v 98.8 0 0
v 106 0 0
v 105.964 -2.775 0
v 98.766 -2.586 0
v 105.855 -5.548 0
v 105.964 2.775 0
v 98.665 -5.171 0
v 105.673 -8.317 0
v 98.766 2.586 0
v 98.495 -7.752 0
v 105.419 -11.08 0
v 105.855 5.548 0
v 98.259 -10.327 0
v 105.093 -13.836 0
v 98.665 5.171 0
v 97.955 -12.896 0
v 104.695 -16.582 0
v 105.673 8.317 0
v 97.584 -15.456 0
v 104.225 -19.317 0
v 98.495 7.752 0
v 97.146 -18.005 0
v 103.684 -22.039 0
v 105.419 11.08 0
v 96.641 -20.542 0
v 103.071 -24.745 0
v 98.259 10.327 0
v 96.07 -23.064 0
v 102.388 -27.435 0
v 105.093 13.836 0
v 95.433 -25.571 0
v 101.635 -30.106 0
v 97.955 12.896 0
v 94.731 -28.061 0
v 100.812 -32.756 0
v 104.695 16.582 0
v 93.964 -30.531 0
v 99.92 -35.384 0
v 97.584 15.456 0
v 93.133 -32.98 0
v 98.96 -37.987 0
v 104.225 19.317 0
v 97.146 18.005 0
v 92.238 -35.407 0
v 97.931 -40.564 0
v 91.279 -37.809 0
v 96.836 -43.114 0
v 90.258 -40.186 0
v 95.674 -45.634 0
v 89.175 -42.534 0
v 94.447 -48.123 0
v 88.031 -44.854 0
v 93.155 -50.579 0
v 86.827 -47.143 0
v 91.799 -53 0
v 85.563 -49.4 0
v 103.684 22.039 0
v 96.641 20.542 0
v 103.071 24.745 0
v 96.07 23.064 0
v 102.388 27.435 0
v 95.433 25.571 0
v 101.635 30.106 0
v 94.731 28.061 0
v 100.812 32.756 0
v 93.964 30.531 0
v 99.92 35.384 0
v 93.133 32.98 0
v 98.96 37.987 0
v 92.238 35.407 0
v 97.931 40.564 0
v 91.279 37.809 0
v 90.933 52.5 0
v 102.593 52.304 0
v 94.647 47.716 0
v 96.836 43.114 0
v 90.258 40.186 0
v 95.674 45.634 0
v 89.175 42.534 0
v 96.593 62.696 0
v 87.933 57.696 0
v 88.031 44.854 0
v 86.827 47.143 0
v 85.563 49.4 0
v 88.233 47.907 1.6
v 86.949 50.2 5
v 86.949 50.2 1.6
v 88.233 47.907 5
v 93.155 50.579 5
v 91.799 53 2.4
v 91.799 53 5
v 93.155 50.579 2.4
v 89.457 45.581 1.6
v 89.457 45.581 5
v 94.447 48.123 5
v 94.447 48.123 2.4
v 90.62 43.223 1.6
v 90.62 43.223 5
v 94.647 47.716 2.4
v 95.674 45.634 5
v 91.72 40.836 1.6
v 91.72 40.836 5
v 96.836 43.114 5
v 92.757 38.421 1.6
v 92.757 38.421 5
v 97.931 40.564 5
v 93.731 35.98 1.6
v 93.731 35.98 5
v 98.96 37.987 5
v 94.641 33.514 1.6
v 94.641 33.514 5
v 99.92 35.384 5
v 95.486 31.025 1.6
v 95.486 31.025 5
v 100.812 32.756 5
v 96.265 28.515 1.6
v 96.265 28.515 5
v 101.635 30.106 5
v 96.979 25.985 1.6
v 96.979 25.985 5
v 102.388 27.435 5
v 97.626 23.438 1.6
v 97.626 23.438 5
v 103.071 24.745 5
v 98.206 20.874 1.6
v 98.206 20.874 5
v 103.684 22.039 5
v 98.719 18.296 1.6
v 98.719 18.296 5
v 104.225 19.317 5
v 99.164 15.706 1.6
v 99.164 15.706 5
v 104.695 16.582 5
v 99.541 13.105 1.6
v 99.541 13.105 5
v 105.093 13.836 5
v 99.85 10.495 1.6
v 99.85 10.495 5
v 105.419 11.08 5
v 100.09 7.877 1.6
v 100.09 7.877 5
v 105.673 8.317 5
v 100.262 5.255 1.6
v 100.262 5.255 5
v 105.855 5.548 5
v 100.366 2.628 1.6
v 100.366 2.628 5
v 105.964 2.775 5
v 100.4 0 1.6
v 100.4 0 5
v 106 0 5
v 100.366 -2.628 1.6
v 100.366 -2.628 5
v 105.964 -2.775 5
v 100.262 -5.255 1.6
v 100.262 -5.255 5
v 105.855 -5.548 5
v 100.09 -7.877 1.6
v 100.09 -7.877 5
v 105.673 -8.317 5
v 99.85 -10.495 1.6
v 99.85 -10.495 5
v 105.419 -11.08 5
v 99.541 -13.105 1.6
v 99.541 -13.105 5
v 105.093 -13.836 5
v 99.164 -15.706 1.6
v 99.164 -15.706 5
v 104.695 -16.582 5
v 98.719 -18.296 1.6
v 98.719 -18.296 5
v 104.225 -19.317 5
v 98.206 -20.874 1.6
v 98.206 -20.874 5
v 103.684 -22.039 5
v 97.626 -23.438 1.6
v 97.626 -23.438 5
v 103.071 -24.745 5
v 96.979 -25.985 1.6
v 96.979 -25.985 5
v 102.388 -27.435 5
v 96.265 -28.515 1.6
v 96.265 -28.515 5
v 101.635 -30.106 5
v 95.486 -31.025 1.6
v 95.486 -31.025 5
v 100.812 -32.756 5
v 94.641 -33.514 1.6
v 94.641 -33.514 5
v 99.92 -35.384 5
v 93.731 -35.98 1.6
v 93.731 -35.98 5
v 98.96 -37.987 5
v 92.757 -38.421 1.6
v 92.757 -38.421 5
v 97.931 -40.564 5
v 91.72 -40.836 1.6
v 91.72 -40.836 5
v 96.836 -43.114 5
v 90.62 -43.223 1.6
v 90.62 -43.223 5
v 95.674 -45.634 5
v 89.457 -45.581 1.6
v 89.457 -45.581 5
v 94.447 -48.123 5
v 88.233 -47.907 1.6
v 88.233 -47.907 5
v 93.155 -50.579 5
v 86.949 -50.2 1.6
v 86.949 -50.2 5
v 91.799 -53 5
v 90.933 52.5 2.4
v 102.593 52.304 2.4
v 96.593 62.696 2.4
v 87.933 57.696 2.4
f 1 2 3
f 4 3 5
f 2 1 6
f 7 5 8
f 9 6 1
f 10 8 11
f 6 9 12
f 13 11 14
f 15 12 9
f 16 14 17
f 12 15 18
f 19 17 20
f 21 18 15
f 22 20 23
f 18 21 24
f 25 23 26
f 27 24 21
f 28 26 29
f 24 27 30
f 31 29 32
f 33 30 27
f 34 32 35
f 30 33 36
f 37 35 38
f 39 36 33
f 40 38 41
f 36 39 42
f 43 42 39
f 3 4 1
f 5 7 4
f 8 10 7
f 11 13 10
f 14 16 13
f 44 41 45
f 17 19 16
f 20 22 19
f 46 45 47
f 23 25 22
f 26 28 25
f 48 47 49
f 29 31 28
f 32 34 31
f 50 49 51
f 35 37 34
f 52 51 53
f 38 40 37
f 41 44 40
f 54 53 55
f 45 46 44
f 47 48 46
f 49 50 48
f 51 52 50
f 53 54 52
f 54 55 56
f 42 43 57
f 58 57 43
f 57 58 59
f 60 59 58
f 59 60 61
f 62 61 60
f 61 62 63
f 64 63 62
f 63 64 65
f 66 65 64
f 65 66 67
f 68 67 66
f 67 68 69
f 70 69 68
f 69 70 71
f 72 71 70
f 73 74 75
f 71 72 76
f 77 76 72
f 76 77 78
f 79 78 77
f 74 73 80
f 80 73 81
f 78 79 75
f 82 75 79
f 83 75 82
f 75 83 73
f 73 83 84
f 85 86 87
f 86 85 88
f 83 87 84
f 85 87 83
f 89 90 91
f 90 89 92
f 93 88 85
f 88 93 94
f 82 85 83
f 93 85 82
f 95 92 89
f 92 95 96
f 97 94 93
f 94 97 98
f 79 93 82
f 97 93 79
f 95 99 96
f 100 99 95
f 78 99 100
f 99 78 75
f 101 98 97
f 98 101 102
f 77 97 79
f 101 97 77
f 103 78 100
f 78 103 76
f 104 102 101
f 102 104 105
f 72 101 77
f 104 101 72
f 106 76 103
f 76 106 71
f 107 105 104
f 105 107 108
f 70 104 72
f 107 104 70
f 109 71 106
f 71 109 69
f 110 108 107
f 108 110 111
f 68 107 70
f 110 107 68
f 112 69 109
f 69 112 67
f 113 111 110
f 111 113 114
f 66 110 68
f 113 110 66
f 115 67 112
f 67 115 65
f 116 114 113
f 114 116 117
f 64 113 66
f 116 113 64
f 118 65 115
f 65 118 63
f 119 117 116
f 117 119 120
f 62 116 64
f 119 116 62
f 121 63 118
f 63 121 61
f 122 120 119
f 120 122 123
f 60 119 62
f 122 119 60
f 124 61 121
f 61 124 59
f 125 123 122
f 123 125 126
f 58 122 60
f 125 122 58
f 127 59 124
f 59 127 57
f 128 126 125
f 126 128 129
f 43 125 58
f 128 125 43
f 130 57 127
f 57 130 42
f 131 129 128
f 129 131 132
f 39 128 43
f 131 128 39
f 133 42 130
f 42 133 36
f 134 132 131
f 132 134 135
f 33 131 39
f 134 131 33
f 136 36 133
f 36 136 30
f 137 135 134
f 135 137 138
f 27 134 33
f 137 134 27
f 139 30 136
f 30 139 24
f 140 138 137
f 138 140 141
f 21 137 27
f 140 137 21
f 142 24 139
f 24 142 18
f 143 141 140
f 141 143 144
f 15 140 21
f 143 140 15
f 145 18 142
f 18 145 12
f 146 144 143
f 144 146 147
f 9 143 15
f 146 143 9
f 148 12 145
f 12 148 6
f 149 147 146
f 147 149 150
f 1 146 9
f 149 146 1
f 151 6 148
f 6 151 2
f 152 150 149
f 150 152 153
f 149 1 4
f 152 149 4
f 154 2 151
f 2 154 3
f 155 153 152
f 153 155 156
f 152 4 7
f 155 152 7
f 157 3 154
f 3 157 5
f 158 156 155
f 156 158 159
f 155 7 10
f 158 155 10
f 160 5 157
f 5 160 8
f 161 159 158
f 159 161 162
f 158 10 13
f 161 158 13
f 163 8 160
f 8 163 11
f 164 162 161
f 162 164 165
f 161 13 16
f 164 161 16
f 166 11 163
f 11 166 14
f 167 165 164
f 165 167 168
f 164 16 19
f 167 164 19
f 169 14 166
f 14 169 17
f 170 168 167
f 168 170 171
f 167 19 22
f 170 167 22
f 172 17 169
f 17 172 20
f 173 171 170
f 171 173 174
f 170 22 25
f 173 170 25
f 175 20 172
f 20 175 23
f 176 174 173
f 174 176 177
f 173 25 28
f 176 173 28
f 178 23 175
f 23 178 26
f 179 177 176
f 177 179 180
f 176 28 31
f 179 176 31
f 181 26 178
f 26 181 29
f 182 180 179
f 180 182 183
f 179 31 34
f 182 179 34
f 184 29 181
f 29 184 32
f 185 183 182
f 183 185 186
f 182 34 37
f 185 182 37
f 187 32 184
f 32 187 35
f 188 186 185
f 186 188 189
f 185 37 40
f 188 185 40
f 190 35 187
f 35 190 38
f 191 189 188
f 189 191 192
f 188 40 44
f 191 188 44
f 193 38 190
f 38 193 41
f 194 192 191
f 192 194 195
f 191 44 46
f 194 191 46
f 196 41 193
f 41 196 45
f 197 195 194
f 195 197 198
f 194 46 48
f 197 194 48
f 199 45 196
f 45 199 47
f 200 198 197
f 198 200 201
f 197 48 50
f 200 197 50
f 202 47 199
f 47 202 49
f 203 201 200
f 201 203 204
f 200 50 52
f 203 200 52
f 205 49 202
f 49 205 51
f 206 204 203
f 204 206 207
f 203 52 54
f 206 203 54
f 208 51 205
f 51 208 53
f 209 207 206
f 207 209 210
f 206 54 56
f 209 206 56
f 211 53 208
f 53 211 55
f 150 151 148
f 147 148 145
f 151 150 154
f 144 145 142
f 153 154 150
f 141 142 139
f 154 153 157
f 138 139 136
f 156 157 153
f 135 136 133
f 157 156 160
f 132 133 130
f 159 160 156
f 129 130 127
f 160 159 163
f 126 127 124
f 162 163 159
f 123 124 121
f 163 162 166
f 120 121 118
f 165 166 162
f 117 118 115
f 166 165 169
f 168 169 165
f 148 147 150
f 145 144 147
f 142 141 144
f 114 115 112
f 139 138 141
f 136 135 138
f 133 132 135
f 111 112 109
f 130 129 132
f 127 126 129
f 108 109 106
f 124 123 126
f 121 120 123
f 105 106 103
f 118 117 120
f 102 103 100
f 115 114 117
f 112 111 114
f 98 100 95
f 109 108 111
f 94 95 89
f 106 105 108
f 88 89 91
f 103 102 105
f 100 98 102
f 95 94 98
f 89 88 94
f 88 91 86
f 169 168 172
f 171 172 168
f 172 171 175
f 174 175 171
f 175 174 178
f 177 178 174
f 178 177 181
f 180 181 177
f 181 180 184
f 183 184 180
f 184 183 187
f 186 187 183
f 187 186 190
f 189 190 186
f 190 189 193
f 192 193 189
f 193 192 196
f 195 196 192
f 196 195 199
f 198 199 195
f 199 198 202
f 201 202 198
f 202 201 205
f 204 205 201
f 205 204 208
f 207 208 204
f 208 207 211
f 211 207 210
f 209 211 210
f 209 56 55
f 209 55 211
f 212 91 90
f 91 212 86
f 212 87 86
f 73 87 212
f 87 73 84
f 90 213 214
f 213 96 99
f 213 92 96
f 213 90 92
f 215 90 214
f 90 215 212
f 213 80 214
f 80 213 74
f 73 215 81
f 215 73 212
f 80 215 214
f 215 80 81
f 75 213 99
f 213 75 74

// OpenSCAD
// Saucer topper - a printed platter that drops onto a bought turntable.
//
// THIS IS TWO PRINTS, PLUS A GAUGE YOU PRINT FIRST:
//
//   gauge    <- print this ONE first. A 60-degree arc of the ring, ~10 minutes.
//   ring     <- the locator, once the gauge fits
//   platter  <- the disc the saucer sits in
//
//   openscad --render -D 'part="gauge"' -o tt_gauge.stl topper.scad
//
// view_assembly is a PICTURE, not a part.
//
// WHY THIS REPLACED A WHOLE MOTORISED TURNTABLE
//
// The DIY version - ball race, GT2 belt, NEMA17, TMC2209, an ESP32 and an
// evening of wiring - was retired. A ComXim
// does the motor half better than we would and costs less than the parts, and
// the build was going to hurt to assemble. What a bought turntable CANNOT do is
// be shaped for this saucer and these hands. So print only that part.
//
// FOR UNSTEADY HANDS. The requirement, not a nicety:
//
//   Everything DROPS ON and finds its own centre. The ring funnels onto the
//   turntable, the saucer funnels into the recess. Nothing needs aiming, and
//   nothing needs holding steady while something else is tightened.
//
//   A 6mm OVERHANG the whole way round, so the platter lifts off with fingers
//   under the edge anywhere at all - better than scallops, which still have to
//   be found.
//
//   No fasteners. One glued face, done once, on a bench.
//
// WHY A SEPARATE RING INSTEAD OF A SKIRT ON THE PLATTER
//
// A one-piece topper with a skirt has a 200mm void under it, and that void has
// a ceiling. Right way up it is an impossible bridge; upside down the rim
// starts in mid-air as an island ring. There is no orientation that prints it -
// the same wall the saucer hit before it was split at the equator.
//
// Split, both parts are trivial: the platter is a flat disc with a valley
// milled in the top, the ring is a ring. Neither has an overhang anywhere. The
// glue joint is 3600mm2 of flat annulus you can see and reach - which is the
// lesson the saucer's own rim taught.

part = "gauge";  // gauge | ring | platter | view_assembly

$fn = 240;

// ------------------------------------------------- THE BOUGHT TURNTABLE
// MEASURED, NOT SPEC'D. "20cm / 7.9in" is a marketing round number, and this
// ring has to fit the actual disc. Print part=gauge and correct these two
// before committing three hours to the platter: published dimensions vary
// between sources.
comxim_d   = 200.0;         // <- MEASURE. Calipers across the real platter.
comxim_lip = 8.0;           // <- MEASURE. How far the platter's edge stands
                            //    proud of the body below it. The ring must be
                            //    SHORTER than this or it bottoms out on the
                            //    housing and the topper rocks.

ring_clear = 0.8;           // Deliberately loose. 0.22 is this shop's LOCATING
                            // clearance, and it is the wrong number here: a
                            // close fit has to be aimed. This one is meant to
                            // fall on.
lead_in    = 1.6;           // chamfer on the ring's inner bottom edge, so it
                            // funnels rather than catches

// -------------------------------------------------------------- the saucer
// The saucer does NOT rest on its 138mm rim - it rests on the bottom of the
// bell, an annulus 60..73.8mm across, measured off ufo_lens_lower.stl. Sizing
// the recess to the widest diameter would have located precisely nothing.
saucer_foot_d = 73.8;
saucer_fit    = 1.7;        // drops in without aiming, same reasoning as above
recess_d      = saucer_foot_d + saucer_fit;
recess_h      = 2.5;        // enough to locate. Deliberately NOT deeper: the
                            // rim is the glowing band and burying it would
                            // throw away the reason the saucer looks good.

// --------------------------------------------------------------- the parts
overhang   = 6.0;           // finger access, the whole way round
topper_d   = comxim_d + 2 * overhang;
plate_t    = 5.0;           // 4 flexed visibly at 212mm; infill does the rest
ring_h     = 5.0;           // must stay under comxim_lip
ring_id    = comxim_d + ring_clear;

gauge_deg  = 60;            // enough arc to feel the diameter, ~10 min to print

// ------------------------------------------------------------- assertions
assert(ring_h < comxim_lip,
       str("ring is ", ring_h, "mm but the turntable's lip is only ",
           comxim_lip, "mm - it will bottom out on the housing and rock"));
assert((topper_d - ring_id) / 2 >= 2.4,
       str("ring wall would be ", (topper_d - ring_id) / 2,
           "mm - under 6 perimeters"));
assert(recess_d < comxim_d - 20, "recess is too close to the platter edge");
assert(topper_d < 230,
       str(topper_d, "mm - P1S practical bed is ~230, not the nominal 256"));

glue_area = PI * (pow(topper_d / 2, 2) - pow(ring_id / 2, 2));
echo(str("glue face: ", round(glue_area), " mm2 of flat annulus"));

// ==========================================================================

// ------------------------------------------------------------- the platter
// Prints RIGHT WAY UP. The recess is a valley, not an overhang, and the first
// layer is the whole disc - which is the best first layer available, though a
// big flat one, so: brim 5mm, brim-object gap 0.
module platter() {
    difference() {
        cylinder(h = plate_t, d = topper_d);
        // saucer seat, with a funnel so it does not have to be aimed
        translate([0, 0, plate_t - recess_h]) {
            cylinder(h = recess_h + 1, d = recess_d);
            translate([0, 0, recess_h - 1.2])
                cylinder(h = 1.2 + 1, d1 = recess_d, d2 = recess_d + 2.4);
        }
    }
}

// ---------------------------------------------------------------- the ring
// Prints flat, first layer is the full annulus. The lead-in chamfer is on the
// BOTTOM inner edge, which prints as a 45-degree flare off the plate and is
// self-supporting.
module ring_2d_profile() {
    // r-z profile, revolved: outer wall vertical, inner wall vertical above a
    // chamfered mouth.
    polygon([
        [ring_id / 2,            0],
        [topper_d / 2,           0],
        [topper_d / 2,           ring_h],
        [ring_id / 2,            ring_h],
        [ring_id / 2,            lead_in],
        [ring_id / 2 - lead_in,  0],
    ]);
}

module ring() {
    // Pushed through a boolean: a bare rotate_extrude exports non-manifold.
    intersection() {
        rotate_extrude() ring_2d_profile();
        cylinder(h = ring_h, d = topper_d + 1);
    }
}

// --------------------------------------------------------------- the gauge
// Print this FIRST. It tells you whether comxim_d is right for about ten
// minutes of plate time instead of three hours. A tab makes it easy to hold
// and to pull off - it is a throwaway.
module gauge() {
    intersection() {
        ring();
        rotate([0, 0, -gauge_deg / 2])
            linear_extrude(ring_h)
                polygon([[0, 0],
                         [topper_d, 0],
                         [topper_d * cos(gauge_deg), topper_d * sin(gauge_deg)]]);
    }
    // grip tab, outboard so it cannot foul the fit being tested
    rotate([0, 0, gauge_deg / 2])
        translate([topper_d / 2 - 1, -6, 0]) cube([10, 12, 2.4]);
}

// ------------------------------------------------------------------ views
module view_assembly() {
    color("gainsboro") translate([0, 0, ring_h]) platter();
    color("steelblue") ring();
    // the bought turntable, for scale only
    %translate([0, 0, -comxim_lip]) cylinder(h = comxim_lip, d = comxim_d);
}

if      (part == "platter")       platter();
else if (part == "ring")          ring();
else if (part == "gauge")         gauge();
else if (part == "view_assembly") view_assembly();
else assert(false, str("unknown part: ", part));
